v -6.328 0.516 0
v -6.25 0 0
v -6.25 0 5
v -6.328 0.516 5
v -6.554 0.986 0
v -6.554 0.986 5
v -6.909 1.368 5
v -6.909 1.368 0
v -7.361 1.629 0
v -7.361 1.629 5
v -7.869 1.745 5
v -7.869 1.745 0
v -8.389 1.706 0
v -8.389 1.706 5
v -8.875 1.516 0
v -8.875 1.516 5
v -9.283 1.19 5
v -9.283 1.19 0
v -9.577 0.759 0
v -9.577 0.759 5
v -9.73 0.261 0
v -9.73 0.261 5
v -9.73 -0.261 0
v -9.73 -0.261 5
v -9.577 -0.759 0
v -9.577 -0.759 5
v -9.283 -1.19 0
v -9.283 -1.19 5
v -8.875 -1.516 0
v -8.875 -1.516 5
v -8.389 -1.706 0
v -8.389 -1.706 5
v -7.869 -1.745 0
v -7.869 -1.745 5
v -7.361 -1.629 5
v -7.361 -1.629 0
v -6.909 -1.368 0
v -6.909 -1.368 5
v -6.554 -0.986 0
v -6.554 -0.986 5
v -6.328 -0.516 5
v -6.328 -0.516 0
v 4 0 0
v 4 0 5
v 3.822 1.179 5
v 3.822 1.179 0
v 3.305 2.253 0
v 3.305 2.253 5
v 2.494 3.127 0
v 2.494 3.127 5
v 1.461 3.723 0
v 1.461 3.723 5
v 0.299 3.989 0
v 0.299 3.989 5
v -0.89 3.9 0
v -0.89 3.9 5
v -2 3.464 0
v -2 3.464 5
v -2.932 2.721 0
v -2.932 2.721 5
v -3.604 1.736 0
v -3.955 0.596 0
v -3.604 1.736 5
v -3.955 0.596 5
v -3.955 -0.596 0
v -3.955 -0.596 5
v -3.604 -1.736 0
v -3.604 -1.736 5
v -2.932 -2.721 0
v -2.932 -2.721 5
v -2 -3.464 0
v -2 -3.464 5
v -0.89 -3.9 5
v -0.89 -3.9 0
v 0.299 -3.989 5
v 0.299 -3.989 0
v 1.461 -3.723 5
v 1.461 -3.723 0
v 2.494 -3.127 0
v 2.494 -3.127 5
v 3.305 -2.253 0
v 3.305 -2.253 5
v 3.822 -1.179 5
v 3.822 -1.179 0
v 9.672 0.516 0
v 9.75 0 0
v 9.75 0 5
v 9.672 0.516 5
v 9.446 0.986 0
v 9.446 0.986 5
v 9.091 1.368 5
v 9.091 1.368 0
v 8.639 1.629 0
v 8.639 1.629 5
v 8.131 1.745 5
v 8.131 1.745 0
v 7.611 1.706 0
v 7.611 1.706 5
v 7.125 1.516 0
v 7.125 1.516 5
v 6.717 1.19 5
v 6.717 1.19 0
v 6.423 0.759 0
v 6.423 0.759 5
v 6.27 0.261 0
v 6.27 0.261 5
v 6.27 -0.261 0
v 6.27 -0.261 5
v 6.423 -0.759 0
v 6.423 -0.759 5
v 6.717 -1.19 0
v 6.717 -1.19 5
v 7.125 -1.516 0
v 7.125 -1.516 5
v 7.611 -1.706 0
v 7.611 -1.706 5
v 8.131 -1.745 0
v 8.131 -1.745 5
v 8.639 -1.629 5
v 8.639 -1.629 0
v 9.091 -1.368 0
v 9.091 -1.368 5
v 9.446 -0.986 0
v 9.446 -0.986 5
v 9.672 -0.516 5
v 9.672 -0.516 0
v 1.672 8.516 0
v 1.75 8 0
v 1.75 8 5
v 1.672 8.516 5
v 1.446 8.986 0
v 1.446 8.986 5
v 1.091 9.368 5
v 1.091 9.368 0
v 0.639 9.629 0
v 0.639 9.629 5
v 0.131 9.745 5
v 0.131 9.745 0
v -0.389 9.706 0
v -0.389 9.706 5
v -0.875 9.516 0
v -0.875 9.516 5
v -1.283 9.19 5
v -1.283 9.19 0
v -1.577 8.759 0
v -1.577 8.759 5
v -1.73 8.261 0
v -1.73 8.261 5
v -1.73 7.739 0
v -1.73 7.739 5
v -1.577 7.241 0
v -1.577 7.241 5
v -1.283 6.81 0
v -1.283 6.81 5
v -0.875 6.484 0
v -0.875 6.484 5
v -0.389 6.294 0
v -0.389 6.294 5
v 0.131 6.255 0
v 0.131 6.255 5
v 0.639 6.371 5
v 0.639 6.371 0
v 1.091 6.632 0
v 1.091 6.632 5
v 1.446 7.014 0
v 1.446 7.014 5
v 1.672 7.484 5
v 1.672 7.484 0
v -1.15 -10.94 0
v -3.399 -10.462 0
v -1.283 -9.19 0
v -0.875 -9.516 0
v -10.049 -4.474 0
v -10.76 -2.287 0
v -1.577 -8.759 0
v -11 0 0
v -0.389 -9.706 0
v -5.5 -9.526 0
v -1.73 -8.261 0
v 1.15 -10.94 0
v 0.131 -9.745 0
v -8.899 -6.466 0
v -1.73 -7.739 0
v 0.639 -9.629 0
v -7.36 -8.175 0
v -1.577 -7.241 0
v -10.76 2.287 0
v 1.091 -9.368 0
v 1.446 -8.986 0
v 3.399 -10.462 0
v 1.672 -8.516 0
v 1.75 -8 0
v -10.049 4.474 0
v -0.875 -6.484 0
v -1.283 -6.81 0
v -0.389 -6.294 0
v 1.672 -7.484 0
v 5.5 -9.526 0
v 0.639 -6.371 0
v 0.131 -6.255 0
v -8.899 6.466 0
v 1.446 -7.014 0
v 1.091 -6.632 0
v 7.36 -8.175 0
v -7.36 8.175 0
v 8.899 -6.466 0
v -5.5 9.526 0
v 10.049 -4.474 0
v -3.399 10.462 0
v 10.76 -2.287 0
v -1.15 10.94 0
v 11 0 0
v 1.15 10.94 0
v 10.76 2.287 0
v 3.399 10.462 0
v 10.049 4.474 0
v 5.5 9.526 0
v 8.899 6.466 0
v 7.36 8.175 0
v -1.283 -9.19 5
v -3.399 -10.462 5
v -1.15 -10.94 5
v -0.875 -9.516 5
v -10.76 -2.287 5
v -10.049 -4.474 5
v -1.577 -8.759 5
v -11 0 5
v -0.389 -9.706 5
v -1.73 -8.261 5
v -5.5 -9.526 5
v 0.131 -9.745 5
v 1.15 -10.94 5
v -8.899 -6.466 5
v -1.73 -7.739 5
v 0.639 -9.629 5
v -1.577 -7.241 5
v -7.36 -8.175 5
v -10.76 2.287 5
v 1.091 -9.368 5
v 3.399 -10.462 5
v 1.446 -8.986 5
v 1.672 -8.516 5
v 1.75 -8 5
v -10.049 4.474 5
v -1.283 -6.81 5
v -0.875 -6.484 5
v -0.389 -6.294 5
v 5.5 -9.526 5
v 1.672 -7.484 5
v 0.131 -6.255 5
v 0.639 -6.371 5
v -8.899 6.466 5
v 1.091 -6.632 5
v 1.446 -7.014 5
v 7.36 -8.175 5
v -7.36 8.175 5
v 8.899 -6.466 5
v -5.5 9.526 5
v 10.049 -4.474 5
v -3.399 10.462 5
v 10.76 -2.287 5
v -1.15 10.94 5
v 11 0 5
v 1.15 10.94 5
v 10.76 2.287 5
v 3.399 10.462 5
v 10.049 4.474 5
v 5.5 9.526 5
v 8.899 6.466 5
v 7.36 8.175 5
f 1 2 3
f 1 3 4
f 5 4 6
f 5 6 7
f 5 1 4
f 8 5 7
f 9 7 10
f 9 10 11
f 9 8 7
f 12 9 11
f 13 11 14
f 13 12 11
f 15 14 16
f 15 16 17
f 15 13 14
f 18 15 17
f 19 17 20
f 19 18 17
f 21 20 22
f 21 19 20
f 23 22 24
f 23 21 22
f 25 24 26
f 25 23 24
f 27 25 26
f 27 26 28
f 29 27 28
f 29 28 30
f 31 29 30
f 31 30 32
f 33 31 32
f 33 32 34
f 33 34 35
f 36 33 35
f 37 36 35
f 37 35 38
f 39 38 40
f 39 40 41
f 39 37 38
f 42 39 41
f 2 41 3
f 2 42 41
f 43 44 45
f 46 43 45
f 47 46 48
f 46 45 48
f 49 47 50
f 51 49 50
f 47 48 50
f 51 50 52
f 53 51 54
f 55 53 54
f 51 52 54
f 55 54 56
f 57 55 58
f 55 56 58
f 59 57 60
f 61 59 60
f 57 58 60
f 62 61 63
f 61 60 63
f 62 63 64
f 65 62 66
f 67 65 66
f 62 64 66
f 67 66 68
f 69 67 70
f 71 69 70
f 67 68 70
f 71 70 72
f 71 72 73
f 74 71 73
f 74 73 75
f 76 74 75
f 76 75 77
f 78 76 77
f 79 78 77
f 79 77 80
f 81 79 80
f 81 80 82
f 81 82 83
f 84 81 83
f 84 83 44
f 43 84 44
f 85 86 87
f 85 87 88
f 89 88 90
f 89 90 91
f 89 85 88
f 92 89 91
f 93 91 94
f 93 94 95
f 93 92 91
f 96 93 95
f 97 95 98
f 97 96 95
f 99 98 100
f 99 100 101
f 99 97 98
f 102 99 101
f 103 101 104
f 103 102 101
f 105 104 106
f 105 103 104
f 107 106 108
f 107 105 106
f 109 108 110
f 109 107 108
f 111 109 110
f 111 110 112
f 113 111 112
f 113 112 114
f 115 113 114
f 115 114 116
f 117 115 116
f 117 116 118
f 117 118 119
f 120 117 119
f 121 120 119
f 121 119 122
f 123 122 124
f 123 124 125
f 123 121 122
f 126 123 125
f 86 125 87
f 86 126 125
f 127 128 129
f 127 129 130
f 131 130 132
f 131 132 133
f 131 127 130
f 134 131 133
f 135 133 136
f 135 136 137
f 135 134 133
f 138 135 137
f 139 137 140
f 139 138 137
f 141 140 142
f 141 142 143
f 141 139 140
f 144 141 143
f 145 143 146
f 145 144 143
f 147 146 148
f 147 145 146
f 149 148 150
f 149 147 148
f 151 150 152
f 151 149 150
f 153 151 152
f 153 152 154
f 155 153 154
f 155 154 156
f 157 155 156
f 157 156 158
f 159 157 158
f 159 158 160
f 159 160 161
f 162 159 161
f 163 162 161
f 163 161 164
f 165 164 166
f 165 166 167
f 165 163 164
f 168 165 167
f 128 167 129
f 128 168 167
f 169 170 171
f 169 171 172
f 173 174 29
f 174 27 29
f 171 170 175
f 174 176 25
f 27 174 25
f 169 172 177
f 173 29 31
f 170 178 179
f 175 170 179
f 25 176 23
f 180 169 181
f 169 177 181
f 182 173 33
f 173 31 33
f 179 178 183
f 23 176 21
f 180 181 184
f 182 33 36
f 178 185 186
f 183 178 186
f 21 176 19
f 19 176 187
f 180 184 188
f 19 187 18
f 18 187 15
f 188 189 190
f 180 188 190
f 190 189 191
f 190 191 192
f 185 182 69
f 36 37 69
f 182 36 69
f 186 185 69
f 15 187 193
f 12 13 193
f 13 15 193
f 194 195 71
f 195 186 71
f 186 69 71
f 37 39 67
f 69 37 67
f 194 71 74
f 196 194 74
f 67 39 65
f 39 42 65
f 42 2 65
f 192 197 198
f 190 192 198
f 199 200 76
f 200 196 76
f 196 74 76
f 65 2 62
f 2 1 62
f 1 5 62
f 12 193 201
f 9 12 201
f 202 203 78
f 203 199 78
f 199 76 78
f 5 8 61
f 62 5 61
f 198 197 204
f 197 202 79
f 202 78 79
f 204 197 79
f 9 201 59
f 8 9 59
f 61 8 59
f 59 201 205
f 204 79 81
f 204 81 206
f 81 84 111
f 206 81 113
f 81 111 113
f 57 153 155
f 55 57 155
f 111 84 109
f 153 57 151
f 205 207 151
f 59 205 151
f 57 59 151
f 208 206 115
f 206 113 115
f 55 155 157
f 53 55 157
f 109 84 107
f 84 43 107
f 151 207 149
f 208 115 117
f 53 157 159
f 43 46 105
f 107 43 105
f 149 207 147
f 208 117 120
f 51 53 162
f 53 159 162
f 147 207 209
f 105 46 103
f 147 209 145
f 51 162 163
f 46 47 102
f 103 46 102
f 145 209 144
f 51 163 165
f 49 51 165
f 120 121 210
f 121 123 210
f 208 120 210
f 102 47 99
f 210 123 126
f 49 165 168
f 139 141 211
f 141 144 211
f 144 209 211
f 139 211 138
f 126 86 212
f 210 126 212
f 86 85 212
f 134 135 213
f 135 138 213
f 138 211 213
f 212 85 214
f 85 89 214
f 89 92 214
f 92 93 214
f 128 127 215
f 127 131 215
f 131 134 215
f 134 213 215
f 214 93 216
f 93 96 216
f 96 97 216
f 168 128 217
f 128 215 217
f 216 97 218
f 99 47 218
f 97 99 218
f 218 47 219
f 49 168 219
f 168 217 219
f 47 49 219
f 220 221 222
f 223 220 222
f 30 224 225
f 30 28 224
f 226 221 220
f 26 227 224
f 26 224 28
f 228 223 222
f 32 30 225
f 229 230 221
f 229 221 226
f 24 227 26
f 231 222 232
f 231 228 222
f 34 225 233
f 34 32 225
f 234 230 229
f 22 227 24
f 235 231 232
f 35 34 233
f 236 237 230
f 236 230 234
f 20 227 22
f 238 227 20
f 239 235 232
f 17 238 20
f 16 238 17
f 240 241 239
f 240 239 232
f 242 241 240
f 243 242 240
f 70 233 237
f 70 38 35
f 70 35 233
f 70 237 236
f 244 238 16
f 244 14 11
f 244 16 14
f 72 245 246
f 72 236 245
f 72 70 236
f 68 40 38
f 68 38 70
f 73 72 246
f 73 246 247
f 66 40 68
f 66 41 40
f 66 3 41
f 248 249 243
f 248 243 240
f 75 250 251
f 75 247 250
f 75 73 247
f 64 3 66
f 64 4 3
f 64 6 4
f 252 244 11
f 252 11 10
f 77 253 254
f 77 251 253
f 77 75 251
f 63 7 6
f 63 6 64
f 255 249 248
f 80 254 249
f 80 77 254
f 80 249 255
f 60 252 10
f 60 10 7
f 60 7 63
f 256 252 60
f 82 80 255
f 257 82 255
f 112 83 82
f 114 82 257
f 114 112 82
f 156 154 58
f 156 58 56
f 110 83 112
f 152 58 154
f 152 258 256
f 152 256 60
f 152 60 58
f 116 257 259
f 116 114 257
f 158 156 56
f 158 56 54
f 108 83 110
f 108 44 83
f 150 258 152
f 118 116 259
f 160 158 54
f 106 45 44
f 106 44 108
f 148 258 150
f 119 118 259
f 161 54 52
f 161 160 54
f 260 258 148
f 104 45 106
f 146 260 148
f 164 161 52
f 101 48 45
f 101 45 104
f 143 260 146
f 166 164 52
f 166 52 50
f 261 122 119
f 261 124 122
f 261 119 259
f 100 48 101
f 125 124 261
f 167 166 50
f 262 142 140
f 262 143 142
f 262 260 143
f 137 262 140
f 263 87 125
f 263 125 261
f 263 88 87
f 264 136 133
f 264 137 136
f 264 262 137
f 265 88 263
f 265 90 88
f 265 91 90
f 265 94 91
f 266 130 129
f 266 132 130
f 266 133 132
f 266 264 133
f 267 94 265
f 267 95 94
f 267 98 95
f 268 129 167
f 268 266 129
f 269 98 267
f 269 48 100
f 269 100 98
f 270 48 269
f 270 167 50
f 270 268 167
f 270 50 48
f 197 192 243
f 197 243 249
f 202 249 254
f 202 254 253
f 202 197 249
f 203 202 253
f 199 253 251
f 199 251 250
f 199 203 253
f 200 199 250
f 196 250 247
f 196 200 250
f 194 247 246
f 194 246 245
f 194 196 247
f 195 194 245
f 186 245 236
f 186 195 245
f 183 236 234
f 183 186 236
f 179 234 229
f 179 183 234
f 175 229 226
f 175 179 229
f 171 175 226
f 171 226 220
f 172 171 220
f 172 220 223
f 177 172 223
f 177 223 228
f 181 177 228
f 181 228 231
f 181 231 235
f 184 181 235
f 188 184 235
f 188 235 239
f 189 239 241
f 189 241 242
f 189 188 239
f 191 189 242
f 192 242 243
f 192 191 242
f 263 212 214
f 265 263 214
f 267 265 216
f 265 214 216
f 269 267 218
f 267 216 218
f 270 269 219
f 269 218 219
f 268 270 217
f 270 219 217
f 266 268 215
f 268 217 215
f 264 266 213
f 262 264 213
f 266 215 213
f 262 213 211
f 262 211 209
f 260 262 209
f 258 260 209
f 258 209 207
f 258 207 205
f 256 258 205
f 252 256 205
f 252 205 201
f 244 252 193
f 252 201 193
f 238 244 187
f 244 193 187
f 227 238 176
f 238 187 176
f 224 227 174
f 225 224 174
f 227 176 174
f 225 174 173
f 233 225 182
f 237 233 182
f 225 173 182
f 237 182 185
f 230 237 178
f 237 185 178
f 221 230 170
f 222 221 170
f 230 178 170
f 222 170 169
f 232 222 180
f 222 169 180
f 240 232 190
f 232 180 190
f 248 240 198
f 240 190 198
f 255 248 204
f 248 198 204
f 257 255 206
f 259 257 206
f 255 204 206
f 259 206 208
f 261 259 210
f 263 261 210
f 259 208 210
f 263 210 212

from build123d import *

# Parameters (mm, degrees)
SKETCH_1_R          = 11
SKETCH_1_R_2        = 1.75
EXTRUDE_1_DEPTH     = 5
SKETCH_2_R          = 4
SKETCH_2_R_2        = 2.35
CUT_EXTRUDE_1_DEPTH = 10


with BuildPart() as part:
    # 스케치1 → 보스-돌출1 (new body)
    with BuildSketch(Plane.XY):
        Circle(SKETCH_1_R)
        with Locations((0, 8)):
            Circle(SKETCH_1_R_2, mode=Mode.SUBTRACT)
        with Locations((8, 0)):
            Circle(SKETCH_1_R_2, mode=Mode.SUBTRACT)
        with Locations((0, -8)):
            Circle(SKETCH_1_R_2, mode=Mode.SUBTRACT)
        with Locations((-8, 0)):
            Circle(SKETCH_1_R_2, mode=Mode.SUBTRACT)
    extrude(amount=EXTRUDE_1_DEPTH)

    # 스케치2 → 컷-돌출1 (cut)
    # profile 1 of 2: a face of its own
    with BuildSketch(Plane.XY.offset(5)):
        Circle(SKETCH_2_R)
        Circle(SKETCH_2_R_2, mode=Mode.SUBTRACT)
    # profile 2 of 2: a face of its own
    with BuildSketch(Plane.XY.offset(5)):
        Circle(SKETCH_2_R_2)
    extrude(amount=-CUT_EXTRUDE_1_DEPTH, mode=Mode.SUBTRACT)


solid = part.part
